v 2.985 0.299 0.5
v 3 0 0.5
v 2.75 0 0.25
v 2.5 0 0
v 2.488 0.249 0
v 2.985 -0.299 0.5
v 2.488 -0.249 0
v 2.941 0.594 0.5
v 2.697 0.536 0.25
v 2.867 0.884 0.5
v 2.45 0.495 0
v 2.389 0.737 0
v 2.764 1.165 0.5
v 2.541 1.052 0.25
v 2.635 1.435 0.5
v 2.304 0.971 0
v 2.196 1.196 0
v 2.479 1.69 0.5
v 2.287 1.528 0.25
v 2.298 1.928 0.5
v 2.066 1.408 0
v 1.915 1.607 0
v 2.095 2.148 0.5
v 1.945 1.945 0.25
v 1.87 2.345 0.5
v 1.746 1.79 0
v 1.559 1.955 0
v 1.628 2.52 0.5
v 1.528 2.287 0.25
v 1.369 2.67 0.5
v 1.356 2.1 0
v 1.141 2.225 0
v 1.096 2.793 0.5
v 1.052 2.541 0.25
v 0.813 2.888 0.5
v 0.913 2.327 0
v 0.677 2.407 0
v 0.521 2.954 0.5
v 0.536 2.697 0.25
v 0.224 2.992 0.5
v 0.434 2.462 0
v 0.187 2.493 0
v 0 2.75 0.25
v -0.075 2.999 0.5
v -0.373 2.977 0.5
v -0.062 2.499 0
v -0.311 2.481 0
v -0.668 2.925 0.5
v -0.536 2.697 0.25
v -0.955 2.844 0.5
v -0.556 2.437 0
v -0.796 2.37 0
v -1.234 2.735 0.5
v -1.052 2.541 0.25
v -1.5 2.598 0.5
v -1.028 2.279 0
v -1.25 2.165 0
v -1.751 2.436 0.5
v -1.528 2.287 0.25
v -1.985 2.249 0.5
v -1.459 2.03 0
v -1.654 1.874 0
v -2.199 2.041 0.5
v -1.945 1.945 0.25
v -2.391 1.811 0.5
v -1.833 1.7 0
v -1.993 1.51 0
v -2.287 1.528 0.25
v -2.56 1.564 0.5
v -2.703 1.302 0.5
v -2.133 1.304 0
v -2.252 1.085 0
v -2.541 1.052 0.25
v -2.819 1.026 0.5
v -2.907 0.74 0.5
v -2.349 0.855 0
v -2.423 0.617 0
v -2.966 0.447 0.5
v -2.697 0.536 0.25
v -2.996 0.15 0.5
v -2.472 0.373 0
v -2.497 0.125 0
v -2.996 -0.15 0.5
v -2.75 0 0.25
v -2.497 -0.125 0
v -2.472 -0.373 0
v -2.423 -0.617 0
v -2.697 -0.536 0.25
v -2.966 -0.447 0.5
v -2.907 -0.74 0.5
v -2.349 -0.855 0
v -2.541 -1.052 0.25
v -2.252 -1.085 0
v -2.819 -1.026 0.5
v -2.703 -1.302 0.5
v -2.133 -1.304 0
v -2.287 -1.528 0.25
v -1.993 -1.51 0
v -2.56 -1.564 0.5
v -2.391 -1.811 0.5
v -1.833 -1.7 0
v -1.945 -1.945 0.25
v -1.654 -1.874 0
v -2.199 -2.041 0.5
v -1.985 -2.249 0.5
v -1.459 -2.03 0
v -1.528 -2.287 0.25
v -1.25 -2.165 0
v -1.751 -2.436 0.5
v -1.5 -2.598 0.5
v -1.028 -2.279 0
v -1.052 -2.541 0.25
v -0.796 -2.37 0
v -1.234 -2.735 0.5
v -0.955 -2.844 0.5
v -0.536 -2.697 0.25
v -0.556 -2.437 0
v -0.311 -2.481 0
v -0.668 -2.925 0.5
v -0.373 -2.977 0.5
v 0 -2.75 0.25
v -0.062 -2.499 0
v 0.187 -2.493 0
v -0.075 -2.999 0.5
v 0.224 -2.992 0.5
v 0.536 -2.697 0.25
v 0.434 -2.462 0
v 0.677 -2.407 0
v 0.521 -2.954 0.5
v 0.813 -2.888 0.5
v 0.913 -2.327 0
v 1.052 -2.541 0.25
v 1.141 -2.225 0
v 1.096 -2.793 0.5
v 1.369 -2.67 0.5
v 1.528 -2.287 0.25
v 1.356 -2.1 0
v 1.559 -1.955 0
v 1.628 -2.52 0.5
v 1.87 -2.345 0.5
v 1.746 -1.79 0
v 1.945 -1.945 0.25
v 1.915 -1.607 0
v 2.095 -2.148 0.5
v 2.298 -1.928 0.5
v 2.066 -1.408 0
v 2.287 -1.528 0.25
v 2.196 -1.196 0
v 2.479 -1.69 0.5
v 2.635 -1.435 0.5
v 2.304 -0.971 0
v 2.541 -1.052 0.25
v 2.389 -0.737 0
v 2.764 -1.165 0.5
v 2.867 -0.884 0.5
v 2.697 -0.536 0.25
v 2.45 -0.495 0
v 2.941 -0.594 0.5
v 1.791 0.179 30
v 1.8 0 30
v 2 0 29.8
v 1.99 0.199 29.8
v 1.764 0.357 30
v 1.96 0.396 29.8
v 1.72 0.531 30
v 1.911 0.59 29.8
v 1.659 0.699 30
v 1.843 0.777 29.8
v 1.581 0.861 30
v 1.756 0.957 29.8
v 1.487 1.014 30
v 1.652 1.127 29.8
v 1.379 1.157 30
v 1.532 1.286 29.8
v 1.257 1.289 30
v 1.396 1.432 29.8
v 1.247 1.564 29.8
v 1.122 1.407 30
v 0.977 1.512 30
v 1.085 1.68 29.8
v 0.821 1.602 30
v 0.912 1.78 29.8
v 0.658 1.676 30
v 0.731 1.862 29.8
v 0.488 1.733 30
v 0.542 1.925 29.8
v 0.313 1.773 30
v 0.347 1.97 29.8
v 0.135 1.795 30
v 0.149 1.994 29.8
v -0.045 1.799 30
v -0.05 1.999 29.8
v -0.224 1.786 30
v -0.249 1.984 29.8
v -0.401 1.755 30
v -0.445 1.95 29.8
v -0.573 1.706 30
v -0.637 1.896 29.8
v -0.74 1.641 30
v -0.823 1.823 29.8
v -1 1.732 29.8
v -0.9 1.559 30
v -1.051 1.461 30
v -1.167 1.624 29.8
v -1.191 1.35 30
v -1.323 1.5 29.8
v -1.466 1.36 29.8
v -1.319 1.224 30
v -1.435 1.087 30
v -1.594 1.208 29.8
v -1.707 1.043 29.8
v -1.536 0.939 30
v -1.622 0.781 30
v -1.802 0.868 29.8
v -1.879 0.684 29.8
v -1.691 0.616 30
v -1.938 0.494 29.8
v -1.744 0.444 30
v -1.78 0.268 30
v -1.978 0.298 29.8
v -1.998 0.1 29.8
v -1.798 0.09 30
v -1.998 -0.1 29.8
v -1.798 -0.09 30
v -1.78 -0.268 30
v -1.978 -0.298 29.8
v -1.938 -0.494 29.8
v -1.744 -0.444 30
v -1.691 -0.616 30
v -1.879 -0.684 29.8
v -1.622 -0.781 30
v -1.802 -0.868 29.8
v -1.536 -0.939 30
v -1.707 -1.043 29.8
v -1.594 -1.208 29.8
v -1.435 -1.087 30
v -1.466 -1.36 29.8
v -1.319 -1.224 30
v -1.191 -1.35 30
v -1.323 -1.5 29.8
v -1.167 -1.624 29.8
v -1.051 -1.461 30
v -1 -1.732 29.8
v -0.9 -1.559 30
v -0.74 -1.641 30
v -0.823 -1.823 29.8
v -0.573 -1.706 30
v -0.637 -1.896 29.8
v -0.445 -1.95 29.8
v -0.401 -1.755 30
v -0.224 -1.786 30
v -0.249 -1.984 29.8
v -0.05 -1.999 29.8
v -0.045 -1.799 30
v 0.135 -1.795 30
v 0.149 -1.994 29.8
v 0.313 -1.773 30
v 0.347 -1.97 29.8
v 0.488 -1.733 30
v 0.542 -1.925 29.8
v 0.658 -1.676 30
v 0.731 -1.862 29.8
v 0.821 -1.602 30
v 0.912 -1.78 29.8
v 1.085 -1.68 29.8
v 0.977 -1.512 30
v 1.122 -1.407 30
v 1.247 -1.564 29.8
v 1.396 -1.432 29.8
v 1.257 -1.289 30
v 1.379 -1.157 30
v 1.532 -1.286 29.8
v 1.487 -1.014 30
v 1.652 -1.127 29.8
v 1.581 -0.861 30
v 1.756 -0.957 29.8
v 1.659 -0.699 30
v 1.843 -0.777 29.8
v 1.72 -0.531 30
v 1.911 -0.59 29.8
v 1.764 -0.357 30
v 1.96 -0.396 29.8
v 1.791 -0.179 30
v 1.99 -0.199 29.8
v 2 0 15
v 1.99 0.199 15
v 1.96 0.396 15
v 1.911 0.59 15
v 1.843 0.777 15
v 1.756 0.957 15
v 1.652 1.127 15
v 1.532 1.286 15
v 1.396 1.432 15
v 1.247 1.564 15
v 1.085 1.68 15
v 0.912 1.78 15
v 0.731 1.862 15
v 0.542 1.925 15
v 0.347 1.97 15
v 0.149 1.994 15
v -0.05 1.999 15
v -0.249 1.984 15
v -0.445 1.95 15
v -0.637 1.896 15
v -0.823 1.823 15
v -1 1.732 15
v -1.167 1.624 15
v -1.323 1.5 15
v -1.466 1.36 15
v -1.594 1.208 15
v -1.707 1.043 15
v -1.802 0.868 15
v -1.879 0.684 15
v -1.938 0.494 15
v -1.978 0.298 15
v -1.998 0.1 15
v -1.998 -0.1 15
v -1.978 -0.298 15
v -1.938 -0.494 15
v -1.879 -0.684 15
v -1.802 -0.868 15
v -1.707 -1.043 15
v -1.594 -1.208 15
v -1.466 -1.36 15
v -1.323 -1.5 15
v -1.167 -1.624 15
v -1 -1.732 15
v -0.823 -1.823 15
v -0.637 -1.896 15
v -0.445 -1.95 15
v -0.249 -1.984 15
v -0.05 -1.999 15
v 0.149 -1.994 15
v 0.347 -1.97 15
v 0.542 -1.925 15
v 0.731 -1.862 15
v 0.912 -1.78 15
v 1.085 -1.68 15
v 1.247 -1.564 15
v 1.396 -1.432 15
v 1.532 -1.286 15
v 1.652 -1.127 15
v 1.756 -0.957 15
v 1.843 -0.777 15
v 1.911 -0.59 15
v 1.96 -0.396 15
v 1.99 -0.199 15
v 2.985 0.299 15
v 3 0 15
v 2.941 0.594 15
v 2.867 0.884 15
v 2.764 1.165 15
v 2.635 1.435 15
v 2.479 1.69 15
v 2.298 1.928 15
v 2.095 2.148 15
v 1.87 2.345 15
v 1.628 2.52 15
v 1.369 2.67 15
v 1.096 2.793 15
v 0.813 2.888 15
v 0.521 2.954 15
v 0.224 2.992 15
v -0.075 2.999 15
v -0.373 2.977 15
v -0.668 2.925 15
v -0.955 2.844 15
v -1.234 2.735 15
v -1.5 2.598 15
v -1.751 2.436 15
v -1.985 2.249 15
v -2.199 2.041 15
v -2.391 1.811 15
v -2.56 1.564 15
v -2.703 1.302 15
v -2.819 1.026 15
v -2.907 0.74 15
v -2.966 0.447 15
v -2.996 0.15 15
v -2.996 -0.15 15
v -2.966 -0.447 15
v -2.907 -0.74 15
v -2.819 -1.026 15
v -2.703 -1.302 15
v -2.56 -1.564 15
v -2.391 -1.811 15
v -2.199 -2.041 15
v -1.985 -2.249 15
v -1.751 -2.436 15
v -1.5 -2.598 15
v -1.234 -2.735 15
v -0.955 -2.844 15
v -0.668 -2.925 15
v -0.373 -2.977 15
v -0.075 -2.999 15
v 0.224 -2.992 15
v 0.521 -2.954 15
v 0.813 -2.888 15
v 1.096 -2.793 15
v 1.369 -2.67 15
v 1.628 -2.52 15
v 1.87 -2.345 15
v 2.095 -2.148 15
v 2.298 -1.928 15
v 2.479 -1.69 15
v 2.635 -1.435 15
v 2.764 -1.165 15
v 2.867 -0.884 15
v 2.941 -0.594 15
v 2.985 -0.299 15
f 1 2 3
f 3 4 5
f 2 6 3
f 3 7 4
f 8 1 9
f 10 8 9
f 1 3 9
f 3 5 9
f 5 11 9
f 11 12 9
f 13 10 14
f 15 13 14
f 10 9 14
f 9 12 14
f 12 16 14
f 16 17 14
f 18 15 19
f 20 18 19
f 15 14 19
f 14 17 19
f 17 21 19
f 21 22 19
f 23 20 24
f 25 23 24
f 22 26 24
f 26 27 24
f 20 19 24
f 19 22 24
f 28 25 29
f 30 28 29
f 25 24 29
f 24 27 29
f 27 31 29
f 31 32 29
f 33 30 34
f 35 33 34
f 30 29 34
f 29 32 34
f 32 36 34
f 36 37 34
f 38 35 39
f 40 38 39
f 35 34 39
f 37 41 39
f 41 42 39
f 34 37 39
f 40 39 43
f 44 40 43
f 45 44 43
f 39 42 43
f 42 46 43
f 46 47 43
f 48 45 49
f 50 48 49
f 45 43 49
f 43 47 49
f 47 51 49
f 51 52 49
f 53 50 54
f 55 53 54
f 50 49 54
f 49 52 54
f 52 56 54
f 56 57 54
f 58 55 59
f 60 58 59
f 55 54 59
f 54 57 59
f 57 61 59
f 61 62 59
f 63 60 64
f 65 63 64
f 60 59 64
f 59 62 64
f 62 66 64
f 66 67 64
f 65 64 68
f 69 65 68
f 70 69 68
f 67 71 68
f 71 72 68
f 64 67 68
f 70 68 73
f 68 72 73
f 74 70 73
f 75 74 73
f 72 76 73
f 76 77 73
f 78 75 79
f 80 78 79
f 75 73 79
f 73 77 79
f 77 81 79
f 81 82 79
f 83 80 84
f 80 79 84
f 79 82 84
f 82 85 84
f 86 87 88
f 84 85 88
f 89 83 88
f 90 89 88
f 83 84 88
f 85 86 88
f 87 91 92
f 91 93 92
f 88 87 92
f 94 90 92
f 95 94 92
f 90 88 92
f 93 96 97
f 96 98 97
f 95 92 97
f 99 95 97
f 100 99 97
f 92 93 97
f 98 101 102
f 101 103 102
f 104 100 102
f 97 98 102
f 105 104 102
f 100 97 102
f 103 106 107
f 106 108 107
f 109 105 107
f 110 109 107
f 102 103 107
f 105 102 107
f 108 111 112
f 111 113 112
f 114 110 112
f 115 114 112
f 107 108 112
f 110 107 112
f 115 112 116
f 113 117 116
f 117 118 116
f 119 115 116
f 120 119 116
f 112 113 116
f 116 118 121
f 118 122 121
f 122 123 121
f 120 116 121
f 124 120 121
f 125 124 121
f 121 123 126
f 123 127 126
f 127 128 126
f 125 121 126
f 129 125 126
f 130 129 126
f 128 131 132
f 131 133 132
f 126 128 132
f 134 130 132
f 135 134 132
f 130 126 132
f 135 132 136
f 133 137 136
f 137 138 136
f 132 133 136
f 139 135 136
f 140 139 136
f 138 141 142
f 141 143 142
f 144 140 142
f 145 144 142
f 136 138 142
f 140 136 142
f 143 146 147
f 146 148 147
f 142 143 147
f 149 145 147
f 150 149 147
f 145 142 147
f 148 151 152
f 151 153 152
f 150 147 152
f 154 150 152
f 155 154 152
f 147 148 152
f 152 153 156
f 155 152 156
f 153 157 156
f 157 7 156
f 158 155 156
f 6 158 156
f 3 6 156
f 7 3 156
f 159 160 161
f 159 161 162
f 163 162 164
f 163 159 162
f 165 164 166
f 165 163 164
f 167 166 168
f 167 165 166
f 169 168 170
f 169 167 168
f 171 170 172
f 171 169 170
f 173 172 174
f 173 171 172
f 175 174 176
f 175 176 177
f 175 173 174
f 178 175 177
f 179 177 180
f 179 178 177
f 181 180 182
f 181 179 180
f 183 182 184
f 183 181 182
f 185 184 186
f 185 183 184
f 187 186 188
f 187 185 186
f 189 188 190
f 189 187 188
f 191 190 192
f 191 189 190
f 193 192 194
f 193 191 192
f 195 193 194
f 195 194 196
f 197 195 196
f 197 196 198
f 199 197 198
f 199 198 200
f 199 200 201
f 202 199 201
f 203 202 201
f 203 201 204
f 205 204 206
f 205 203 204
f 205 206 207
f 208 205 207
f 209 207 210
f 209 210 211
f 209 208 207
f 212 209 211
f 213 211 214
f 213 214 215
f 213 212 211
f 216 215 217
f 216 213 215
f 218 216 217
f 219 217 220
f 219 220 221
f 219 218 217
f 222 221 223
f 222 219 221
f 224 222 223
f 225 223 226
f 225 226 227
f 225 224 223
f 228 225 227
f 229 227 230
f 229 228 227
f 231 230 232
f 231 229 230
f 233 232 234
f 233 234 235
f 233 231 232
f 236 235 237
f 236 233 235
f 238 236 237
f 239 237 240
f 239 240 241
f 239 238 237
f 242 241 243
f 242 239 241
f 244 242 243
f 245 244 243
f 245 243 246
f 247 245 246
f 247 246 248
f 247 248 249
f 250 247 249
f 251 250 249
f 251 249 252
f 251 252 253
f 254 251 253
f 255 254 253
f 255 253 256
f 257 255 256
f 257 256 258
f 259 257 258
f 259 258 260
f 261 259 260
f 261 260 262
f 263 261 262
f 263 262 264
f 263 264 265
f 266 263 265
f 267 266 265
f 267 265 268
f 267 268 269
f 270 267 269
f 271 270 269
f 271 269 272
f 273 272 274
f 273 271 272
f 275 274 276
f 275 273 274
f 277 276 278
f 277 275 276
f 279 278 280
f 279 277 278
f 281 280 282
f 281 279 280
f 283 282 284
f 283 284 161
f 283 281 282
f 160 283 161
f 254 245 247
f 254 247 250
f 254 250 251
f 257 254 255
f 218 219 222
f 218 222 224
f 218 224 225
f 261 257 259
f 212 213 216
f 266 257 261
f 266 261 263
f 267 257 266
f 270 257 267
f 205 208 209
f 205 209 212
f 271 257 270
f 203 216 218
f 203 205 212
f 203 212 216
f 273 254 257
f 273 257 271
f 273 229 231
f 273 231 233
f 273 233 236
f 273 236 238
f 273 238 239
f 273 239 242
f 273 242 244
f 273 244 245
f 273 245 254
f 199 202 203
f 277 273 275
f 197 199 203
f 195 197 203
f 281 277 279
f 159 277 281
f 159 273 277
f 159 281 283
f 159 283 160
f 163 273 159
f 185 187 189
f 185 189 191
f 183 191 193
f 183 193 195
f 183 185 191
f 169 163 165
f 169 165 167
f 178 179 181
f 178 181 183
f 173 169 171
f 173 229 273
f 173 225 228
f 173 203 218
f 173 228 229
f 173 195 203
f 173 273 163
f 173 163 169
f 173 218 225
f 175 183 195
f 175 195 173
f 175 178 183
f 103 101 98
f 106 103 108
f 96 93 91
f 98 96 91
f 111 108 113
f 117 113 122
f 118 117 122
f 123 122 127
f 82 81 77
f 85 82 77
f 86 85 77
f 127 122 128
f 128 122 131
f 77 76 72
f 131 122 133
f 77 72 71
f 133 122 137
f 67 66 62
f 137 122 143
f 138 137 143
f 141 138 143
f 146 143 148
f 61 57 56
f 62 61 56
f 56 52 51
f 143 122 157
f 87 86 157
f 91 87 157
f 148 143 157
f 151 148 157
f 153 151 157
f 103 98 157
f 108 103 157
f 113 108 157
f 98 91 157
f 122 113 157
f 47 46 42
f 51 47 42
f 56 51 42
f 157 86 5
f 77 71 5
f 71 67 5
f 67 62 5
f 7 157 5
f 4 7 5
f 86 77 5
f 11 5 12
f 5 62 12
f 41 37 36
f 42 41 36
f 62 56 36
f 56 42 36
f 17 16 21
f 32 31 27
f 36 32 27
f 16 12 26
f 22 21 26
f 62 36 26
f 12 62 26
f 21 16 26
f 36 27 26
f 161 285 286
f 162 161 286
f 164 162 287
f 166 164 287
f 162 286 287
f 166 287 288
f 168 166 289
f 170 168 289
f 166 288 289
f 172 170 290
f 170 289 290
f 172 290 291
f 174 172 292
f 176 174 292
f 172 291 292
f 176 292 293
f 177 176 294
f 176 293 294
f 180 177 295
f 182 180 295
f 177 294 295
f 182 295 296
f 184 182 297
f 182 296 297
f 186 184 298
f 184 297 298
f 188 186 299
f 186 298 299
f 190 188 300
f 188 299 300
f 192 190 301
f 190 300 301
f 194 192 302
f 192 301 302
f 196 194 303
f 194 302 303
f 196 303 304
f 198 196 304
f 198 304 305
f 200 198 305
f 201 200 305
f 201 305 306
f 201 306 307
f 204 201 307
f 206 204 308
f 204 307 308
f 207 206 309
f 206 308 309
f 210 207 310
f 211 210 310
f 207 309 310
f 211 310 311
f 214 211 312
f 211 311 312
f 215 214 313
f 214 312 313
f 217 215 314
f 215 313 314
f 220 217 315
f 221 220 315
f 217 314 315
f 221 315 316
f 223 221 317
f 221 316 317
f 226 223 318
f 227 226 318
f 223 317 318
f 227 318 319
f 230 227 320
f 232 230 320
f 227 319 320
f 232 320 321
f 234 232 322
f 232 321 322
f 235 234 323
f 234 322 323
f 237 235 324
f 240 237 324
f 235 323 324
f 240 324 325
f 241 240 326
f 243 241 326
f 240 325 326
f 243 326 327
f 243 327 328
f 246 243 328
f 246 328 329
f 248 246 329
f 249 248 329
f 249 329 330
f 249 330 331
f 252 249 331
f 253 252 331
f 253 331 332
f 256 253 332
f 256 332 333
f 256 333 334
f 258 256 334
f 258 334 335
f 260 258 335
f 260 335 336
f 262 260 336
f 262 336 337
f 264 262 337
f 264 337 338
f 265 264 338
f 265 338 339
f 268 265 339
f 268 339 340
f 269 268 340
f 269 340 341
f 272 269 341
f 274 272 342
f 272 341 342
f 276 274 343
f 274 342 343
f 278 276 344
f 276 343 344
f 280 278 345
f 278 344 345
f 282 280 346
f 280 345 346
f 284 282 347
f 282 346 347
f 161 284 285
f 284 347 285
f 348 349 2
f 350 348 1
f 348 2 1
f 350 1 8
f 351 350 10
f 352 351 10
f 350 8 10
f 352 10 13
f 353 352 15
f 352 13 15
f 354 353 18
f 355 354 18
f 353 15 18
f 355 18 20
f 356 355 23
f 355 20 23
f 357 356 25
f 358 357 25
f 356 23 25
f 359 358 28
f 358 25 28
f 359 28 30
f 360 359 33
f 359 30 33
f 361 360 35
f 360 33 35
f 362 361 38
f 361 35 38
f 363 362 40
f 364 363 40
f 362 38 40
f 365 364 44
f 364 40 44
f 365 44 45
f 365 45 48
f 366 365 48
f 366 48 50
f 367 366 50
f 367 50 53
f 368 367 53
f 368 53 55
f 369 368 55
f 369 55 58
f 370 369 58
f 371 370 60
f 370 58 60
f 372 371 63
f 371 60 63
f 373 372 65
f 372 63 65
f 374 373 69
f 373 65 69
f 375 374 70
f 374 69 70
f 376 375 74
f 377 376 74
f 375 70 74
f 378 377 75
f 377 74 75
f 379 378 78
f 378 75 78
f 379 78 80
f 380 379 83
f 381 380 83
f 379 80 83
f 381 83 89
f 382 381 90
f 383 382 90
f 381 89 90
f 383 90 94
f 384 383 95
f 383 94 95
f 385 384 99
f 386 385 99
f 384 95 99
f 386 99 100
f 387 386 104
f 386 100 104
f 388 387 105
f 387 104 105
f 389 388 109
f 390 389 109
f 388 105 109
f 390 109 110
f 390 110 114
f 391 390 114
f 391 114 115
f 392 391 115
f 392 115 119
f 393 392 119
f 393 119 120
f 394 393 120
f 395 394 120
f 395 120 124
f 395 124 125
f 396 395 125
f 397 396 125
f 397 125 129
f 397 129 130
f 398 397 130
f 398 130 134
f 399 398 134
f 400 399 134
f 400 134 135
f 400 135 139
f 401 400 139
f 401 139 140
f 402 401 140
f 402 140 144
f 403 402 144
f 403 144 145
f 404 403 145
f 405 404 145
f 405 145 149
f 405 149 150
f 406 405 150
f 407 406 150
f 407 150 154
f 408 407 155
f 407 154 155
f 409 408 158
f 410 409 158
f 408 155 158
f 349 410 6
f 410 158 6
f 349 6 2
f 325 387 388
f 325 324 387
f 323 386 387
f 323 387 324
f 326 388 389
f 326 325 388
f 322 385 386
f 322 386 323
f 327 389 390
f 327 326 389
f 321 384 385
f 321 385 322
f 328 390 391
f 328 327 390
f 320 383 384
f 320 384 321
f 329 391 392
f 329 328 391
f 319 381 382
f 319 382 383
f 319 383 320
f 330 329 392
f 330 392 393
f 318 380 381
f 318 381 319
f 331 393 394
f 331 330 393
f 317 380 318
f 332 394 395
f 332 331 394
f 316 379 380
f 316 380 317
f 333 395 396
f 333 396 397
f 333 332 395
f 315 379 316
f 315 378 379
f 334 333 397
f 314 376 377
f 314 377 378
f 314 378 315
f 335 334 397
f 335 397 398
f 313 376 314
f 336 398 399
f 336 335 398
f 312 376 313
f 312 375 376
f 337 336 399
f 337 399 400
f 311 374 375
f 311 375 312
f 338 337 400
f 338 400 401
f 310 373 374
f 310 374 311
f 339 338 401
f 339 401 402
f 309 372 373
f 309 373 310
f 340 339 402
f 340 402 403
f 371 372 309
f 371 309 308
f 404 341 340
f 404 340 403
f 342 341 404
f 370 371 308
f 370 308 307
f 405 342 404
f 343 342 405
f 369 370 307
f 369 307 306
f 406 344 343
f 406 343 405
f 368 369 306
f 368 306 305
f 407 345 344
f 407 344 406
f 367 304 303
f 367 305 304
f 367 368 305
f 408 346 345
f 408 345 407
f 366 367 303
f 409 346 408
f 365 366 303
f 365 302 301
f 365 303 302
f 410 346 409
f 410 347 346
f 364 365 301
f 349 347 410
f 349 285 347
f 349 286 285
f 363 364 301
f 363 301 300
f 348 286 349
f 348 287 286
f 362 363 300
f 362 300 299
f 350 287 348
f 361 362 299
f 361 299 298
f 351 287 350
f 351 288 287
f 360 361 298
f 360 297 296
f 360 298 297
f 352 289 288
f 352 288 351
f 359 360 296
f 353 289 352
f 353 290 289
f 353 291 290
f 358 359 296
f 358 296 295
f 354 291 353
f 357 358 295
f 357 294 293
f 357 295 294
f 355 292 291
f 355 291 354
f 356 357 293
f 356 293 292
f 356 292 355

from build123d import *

# Parameters (mm, degrees)
SKETCH_1_R        = 3
EXTRUDE_175_DEPTH = 15
SKETCH_2_R        = 2
EXTRUDE_1_DEPTH   = 15
CHAMFER_1_SIZE    = 0.2
CHAMFER_2_SIZE    = 0.5


with BuildPart() as part:
    # Эскиз1 → Extrude 175 (new body)
    with BuildSketch(Plane.XY):
        Circle(SKETCH_1_R)
    extrude(amount=EXTRUDE_175_DEPTH)

    # Эскиз2 → Бобышка-Вытянуть1 (add)
    with BuildSketch(Plane.XY.offset(15)):
        Circle(SKETCH_2_R)
    extrude(amount=EXTRUDE_1_DEPTH)

    # Фаска1
    chamfer_1_edges = [part.edges().sort_by_distance(p)[0] for p in [
        (-2, 0, 30),
    ]]
    chamfer(chamfer_1_edges, length=CHAMFER_1_SIZE)

    # Фаска2
    chamfer_2_edges = [part.edges().sort_by_distance(p)[0] for p in [
        (-3, 0, 0),
    ]]
    chamfer(chamfer_2_edges, length=CHAMFER_2_SIZE)


solid = part.part
